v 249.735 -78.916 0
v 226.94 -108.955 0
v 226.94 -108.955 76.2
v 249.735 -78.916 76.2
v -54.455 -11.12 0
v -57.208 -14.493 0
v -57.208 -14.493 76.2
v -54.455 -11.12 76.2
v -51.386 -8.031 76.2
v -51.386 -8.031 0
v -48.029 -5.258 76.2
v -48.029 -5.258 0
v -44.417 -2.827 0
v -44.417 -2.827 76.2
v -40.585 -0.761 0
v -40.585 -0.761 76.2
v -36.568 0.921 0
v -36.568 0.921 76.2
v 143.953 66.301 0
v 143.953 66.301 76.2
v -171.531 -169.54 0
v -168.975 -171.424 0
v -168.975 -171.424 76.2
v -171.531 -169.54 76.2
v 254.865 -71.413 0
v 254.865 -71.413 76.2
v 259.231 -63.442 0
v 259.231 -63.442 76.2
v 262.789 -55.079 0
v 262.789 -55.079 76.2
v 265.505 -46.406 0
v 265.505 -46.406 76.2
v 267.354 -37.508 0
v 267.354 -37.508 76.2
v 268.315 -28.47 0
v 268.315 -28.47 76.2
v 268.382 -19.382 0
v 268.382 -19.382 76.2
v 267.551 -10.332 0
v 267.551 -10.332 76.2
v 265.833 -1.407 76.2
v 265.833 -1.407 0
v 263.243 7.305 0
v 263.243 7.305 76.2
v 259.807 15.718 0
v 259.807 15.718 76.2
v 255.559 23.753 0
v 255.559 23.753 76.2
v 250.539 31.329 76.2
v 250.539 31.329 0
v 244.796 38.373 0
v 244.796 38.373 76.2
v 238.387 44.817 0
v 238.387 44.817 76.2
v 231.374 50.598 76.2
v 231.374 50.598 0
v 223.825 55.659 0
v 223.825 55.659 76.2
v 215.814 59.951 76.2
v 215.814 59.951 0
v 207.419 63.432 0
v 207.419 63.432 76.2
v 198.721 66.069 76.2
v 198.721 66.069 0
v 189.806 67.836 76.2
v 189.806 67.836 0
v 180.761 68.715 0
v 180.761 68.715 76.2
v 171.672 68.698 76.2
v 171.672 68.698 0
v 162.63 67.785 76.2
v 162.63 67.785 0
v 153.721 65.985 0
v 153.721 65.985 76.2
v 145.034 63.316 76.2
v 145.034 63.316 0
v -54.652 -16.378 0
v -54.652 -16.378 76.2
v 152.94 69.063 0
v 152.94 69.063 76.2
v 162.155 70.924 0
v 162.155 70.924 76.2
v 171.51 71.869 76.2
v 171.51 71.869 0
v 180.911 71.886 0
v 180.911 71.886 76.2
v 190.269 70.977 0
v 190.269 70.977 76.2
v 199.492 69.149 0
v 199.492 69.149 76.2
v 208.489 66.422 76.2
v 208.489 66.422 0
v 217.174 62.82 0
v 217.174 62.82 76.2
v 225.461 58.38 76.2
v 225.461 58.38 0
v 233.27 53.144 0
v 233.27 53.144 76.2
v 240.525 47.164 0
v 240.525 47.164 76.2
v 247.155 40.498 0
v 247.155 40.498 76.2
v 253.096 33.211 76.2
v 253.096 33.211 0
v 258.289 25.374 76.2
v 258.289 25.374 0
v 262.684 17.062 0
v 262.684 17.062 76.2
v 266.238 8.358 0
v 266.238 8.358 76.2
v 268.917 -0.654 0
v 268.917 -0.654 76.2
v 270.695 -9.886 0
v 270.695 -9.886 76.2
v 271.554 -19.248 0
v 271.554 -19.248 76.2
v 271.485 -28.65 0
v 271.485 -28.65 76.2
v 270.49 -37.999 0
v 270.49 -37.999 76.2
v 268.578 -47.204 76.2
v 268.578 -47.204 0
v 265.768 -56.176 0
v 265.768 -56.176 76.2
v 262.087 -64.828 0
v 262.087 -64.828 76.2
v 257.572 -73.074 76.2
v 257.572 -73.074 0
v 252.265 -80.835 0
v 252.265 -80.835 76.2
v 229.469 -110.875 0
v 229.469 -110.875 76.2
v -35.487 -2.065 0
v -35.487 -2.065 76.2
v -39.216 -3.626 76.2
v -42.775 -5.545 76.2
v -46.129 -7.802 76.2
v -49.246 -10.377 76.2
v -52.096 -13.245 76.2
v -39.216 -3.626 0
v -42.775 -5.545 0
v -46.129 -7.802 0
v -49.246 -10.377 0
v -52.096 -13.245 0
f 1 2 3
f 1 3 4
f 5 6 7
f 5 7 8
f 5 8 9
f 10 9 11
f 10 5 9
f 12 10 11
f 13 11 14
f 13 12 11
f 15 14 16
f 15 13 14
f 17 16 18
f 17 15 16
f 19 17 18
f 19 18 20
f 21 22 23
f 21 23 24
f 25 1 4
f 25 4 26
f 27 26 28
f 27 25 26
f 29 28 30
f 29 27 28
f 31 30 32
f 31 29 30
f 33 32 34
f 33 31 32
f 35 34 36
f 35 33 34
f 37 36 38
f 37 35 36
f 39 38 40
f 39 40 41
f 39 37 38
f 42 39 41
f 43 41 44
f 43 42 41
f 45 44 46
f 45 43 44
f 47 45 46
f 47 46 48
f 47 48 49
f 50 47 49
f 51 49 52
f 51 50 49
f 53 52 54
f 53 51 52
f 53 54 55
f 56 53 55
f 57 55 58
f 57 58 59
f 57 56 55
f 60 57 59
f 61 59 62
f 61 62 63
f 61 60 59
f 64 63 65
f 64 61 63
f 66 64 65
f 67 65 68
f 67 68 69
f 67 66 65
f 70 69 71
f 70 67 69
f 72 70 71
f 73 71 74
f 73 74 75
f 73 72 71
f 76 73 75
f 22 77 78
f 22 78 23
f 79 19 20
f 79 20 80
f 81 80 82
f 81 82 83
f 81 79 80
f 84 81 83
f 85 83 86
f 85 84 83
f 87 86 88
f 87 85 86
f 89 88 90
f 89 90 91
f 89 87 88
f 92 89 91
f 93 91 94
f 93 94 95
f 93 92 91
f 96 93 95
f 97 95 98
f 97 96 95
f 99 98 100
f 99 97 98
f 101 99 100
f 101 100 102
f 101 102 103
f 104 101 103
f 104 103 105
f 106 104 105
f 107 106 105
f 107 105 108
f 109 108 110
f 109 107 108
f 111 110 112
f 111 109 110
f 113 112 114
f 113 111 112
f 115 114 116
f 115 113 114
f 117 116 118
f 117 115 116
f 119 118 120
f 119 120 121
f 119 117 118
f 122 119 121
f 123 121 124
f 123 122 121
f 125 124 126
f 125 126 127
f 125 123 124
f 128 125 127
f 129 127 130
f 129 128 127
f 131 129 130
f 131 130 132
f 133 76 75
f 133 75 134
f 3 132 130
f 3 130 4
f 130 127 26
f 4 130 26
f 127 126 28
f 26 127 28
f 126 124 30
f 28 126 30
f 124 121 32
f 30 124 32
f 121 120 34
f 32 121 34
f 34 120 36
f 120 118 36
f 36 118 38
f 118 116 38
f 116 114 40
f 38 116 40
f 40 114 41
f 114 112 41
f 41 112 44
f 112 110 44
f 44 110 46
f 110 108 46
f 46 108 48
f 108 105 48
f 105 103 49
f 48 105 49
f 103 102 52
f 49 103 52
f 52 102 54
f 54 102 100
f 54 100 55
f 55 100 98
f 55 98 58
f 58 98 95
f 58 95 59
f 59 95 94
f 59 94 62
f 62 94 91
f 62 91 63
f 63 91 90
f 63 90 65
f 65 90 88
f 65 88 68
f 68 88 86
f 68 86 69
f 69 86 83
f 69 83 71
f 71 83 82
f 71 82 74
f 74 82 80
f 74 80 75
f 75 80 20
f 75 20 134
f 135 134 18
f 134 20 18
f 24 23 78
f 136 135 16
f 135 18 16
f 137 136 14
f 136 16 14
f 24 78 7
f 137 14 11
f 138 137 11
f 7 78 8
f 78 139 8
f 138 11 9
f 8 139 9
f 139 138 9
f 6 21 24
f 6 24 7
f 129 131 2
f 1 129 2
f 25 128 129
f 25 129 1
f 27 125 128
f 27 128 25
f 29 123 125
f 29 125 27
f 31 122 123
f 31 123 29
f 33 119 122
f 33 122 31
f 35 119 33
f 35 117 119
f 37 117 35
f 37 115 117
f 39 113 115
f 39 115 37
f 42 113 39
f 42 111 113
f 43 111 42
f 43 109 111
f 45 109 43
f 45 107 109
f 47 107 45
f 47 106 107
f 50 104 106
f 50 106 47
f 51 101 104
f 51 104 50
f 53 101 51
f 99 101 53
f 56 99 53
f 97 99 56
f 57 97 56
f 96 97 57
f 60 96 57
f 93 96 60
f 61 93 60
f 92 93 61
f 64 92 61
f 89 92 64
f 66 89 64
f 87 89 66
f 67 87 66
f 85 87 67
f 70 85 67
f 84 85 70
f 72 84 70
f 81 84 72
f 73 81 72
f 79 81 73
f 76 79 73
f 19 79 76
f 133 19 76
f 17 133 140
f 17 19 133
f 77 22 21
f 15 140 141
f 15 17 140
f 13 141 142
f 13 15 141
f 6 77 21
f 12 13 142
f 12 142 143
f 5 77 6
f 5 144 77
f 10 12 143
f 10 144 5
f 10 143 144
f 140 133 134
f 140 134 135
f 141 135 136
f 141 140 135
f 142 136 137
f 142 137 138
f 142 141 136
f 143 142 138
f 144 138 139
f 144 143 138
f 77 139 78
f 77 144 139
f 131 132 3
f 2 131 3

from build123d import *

# Parameters (mm, degrees)
EXTRUDE_THIN1_DEPTH = 76.2


with BuildPart() as part:
    # Sketch1 → Extrude-Thin1 (new body)
    with BuildSketch(Plane.XY):
        with BuildLine():
            Line((-171.530725158, -169.540176263), (-57.207776809, -14.493356815))
            ThreePointArc((-57.207776809, -14.493356815), (-48.029088686, -5.258412911), (-36.568222458, 0.920668726))
            Line((-36.568222458, 0.920668726), (143.952557391, 66.301099815))
            ThreePointArc((143.952557391, 66.301099815), (253.095507904, 33.210999285), (252.264699452, -80.834816757))
            Line((252.264699452, -80.834816757), (229.469051384, -110.874685447))
            Line((229.469051384, -110.874685447), (226.93983158, -108.955395947))
            Line((226.93983158, -108.955395947), (249.735479648, -78.915527258))
            ThreePointArc((249.735479648, -78.915527258), (250.538594484, 31.328761583), (145.033742323, 63.315858762))
            Line((145.033742323, 63.315858762), (-35.487037526, -2.064572327))
            ThreePointArc((-35.487037526, -2.064572327), (-46.129270453, -7.80229099), (-54.652337995, -16.377596044))
            Line((-54.652337995, -16.377596044), (-168.975286345, -171.424415492))
            Line((-168.975286345, -171.424415492), (-171.530725158, -169.540176263))
        make_face()
    extrude(amount=EXTRUDE_THIN1_DEPTH)


solid = part.part
